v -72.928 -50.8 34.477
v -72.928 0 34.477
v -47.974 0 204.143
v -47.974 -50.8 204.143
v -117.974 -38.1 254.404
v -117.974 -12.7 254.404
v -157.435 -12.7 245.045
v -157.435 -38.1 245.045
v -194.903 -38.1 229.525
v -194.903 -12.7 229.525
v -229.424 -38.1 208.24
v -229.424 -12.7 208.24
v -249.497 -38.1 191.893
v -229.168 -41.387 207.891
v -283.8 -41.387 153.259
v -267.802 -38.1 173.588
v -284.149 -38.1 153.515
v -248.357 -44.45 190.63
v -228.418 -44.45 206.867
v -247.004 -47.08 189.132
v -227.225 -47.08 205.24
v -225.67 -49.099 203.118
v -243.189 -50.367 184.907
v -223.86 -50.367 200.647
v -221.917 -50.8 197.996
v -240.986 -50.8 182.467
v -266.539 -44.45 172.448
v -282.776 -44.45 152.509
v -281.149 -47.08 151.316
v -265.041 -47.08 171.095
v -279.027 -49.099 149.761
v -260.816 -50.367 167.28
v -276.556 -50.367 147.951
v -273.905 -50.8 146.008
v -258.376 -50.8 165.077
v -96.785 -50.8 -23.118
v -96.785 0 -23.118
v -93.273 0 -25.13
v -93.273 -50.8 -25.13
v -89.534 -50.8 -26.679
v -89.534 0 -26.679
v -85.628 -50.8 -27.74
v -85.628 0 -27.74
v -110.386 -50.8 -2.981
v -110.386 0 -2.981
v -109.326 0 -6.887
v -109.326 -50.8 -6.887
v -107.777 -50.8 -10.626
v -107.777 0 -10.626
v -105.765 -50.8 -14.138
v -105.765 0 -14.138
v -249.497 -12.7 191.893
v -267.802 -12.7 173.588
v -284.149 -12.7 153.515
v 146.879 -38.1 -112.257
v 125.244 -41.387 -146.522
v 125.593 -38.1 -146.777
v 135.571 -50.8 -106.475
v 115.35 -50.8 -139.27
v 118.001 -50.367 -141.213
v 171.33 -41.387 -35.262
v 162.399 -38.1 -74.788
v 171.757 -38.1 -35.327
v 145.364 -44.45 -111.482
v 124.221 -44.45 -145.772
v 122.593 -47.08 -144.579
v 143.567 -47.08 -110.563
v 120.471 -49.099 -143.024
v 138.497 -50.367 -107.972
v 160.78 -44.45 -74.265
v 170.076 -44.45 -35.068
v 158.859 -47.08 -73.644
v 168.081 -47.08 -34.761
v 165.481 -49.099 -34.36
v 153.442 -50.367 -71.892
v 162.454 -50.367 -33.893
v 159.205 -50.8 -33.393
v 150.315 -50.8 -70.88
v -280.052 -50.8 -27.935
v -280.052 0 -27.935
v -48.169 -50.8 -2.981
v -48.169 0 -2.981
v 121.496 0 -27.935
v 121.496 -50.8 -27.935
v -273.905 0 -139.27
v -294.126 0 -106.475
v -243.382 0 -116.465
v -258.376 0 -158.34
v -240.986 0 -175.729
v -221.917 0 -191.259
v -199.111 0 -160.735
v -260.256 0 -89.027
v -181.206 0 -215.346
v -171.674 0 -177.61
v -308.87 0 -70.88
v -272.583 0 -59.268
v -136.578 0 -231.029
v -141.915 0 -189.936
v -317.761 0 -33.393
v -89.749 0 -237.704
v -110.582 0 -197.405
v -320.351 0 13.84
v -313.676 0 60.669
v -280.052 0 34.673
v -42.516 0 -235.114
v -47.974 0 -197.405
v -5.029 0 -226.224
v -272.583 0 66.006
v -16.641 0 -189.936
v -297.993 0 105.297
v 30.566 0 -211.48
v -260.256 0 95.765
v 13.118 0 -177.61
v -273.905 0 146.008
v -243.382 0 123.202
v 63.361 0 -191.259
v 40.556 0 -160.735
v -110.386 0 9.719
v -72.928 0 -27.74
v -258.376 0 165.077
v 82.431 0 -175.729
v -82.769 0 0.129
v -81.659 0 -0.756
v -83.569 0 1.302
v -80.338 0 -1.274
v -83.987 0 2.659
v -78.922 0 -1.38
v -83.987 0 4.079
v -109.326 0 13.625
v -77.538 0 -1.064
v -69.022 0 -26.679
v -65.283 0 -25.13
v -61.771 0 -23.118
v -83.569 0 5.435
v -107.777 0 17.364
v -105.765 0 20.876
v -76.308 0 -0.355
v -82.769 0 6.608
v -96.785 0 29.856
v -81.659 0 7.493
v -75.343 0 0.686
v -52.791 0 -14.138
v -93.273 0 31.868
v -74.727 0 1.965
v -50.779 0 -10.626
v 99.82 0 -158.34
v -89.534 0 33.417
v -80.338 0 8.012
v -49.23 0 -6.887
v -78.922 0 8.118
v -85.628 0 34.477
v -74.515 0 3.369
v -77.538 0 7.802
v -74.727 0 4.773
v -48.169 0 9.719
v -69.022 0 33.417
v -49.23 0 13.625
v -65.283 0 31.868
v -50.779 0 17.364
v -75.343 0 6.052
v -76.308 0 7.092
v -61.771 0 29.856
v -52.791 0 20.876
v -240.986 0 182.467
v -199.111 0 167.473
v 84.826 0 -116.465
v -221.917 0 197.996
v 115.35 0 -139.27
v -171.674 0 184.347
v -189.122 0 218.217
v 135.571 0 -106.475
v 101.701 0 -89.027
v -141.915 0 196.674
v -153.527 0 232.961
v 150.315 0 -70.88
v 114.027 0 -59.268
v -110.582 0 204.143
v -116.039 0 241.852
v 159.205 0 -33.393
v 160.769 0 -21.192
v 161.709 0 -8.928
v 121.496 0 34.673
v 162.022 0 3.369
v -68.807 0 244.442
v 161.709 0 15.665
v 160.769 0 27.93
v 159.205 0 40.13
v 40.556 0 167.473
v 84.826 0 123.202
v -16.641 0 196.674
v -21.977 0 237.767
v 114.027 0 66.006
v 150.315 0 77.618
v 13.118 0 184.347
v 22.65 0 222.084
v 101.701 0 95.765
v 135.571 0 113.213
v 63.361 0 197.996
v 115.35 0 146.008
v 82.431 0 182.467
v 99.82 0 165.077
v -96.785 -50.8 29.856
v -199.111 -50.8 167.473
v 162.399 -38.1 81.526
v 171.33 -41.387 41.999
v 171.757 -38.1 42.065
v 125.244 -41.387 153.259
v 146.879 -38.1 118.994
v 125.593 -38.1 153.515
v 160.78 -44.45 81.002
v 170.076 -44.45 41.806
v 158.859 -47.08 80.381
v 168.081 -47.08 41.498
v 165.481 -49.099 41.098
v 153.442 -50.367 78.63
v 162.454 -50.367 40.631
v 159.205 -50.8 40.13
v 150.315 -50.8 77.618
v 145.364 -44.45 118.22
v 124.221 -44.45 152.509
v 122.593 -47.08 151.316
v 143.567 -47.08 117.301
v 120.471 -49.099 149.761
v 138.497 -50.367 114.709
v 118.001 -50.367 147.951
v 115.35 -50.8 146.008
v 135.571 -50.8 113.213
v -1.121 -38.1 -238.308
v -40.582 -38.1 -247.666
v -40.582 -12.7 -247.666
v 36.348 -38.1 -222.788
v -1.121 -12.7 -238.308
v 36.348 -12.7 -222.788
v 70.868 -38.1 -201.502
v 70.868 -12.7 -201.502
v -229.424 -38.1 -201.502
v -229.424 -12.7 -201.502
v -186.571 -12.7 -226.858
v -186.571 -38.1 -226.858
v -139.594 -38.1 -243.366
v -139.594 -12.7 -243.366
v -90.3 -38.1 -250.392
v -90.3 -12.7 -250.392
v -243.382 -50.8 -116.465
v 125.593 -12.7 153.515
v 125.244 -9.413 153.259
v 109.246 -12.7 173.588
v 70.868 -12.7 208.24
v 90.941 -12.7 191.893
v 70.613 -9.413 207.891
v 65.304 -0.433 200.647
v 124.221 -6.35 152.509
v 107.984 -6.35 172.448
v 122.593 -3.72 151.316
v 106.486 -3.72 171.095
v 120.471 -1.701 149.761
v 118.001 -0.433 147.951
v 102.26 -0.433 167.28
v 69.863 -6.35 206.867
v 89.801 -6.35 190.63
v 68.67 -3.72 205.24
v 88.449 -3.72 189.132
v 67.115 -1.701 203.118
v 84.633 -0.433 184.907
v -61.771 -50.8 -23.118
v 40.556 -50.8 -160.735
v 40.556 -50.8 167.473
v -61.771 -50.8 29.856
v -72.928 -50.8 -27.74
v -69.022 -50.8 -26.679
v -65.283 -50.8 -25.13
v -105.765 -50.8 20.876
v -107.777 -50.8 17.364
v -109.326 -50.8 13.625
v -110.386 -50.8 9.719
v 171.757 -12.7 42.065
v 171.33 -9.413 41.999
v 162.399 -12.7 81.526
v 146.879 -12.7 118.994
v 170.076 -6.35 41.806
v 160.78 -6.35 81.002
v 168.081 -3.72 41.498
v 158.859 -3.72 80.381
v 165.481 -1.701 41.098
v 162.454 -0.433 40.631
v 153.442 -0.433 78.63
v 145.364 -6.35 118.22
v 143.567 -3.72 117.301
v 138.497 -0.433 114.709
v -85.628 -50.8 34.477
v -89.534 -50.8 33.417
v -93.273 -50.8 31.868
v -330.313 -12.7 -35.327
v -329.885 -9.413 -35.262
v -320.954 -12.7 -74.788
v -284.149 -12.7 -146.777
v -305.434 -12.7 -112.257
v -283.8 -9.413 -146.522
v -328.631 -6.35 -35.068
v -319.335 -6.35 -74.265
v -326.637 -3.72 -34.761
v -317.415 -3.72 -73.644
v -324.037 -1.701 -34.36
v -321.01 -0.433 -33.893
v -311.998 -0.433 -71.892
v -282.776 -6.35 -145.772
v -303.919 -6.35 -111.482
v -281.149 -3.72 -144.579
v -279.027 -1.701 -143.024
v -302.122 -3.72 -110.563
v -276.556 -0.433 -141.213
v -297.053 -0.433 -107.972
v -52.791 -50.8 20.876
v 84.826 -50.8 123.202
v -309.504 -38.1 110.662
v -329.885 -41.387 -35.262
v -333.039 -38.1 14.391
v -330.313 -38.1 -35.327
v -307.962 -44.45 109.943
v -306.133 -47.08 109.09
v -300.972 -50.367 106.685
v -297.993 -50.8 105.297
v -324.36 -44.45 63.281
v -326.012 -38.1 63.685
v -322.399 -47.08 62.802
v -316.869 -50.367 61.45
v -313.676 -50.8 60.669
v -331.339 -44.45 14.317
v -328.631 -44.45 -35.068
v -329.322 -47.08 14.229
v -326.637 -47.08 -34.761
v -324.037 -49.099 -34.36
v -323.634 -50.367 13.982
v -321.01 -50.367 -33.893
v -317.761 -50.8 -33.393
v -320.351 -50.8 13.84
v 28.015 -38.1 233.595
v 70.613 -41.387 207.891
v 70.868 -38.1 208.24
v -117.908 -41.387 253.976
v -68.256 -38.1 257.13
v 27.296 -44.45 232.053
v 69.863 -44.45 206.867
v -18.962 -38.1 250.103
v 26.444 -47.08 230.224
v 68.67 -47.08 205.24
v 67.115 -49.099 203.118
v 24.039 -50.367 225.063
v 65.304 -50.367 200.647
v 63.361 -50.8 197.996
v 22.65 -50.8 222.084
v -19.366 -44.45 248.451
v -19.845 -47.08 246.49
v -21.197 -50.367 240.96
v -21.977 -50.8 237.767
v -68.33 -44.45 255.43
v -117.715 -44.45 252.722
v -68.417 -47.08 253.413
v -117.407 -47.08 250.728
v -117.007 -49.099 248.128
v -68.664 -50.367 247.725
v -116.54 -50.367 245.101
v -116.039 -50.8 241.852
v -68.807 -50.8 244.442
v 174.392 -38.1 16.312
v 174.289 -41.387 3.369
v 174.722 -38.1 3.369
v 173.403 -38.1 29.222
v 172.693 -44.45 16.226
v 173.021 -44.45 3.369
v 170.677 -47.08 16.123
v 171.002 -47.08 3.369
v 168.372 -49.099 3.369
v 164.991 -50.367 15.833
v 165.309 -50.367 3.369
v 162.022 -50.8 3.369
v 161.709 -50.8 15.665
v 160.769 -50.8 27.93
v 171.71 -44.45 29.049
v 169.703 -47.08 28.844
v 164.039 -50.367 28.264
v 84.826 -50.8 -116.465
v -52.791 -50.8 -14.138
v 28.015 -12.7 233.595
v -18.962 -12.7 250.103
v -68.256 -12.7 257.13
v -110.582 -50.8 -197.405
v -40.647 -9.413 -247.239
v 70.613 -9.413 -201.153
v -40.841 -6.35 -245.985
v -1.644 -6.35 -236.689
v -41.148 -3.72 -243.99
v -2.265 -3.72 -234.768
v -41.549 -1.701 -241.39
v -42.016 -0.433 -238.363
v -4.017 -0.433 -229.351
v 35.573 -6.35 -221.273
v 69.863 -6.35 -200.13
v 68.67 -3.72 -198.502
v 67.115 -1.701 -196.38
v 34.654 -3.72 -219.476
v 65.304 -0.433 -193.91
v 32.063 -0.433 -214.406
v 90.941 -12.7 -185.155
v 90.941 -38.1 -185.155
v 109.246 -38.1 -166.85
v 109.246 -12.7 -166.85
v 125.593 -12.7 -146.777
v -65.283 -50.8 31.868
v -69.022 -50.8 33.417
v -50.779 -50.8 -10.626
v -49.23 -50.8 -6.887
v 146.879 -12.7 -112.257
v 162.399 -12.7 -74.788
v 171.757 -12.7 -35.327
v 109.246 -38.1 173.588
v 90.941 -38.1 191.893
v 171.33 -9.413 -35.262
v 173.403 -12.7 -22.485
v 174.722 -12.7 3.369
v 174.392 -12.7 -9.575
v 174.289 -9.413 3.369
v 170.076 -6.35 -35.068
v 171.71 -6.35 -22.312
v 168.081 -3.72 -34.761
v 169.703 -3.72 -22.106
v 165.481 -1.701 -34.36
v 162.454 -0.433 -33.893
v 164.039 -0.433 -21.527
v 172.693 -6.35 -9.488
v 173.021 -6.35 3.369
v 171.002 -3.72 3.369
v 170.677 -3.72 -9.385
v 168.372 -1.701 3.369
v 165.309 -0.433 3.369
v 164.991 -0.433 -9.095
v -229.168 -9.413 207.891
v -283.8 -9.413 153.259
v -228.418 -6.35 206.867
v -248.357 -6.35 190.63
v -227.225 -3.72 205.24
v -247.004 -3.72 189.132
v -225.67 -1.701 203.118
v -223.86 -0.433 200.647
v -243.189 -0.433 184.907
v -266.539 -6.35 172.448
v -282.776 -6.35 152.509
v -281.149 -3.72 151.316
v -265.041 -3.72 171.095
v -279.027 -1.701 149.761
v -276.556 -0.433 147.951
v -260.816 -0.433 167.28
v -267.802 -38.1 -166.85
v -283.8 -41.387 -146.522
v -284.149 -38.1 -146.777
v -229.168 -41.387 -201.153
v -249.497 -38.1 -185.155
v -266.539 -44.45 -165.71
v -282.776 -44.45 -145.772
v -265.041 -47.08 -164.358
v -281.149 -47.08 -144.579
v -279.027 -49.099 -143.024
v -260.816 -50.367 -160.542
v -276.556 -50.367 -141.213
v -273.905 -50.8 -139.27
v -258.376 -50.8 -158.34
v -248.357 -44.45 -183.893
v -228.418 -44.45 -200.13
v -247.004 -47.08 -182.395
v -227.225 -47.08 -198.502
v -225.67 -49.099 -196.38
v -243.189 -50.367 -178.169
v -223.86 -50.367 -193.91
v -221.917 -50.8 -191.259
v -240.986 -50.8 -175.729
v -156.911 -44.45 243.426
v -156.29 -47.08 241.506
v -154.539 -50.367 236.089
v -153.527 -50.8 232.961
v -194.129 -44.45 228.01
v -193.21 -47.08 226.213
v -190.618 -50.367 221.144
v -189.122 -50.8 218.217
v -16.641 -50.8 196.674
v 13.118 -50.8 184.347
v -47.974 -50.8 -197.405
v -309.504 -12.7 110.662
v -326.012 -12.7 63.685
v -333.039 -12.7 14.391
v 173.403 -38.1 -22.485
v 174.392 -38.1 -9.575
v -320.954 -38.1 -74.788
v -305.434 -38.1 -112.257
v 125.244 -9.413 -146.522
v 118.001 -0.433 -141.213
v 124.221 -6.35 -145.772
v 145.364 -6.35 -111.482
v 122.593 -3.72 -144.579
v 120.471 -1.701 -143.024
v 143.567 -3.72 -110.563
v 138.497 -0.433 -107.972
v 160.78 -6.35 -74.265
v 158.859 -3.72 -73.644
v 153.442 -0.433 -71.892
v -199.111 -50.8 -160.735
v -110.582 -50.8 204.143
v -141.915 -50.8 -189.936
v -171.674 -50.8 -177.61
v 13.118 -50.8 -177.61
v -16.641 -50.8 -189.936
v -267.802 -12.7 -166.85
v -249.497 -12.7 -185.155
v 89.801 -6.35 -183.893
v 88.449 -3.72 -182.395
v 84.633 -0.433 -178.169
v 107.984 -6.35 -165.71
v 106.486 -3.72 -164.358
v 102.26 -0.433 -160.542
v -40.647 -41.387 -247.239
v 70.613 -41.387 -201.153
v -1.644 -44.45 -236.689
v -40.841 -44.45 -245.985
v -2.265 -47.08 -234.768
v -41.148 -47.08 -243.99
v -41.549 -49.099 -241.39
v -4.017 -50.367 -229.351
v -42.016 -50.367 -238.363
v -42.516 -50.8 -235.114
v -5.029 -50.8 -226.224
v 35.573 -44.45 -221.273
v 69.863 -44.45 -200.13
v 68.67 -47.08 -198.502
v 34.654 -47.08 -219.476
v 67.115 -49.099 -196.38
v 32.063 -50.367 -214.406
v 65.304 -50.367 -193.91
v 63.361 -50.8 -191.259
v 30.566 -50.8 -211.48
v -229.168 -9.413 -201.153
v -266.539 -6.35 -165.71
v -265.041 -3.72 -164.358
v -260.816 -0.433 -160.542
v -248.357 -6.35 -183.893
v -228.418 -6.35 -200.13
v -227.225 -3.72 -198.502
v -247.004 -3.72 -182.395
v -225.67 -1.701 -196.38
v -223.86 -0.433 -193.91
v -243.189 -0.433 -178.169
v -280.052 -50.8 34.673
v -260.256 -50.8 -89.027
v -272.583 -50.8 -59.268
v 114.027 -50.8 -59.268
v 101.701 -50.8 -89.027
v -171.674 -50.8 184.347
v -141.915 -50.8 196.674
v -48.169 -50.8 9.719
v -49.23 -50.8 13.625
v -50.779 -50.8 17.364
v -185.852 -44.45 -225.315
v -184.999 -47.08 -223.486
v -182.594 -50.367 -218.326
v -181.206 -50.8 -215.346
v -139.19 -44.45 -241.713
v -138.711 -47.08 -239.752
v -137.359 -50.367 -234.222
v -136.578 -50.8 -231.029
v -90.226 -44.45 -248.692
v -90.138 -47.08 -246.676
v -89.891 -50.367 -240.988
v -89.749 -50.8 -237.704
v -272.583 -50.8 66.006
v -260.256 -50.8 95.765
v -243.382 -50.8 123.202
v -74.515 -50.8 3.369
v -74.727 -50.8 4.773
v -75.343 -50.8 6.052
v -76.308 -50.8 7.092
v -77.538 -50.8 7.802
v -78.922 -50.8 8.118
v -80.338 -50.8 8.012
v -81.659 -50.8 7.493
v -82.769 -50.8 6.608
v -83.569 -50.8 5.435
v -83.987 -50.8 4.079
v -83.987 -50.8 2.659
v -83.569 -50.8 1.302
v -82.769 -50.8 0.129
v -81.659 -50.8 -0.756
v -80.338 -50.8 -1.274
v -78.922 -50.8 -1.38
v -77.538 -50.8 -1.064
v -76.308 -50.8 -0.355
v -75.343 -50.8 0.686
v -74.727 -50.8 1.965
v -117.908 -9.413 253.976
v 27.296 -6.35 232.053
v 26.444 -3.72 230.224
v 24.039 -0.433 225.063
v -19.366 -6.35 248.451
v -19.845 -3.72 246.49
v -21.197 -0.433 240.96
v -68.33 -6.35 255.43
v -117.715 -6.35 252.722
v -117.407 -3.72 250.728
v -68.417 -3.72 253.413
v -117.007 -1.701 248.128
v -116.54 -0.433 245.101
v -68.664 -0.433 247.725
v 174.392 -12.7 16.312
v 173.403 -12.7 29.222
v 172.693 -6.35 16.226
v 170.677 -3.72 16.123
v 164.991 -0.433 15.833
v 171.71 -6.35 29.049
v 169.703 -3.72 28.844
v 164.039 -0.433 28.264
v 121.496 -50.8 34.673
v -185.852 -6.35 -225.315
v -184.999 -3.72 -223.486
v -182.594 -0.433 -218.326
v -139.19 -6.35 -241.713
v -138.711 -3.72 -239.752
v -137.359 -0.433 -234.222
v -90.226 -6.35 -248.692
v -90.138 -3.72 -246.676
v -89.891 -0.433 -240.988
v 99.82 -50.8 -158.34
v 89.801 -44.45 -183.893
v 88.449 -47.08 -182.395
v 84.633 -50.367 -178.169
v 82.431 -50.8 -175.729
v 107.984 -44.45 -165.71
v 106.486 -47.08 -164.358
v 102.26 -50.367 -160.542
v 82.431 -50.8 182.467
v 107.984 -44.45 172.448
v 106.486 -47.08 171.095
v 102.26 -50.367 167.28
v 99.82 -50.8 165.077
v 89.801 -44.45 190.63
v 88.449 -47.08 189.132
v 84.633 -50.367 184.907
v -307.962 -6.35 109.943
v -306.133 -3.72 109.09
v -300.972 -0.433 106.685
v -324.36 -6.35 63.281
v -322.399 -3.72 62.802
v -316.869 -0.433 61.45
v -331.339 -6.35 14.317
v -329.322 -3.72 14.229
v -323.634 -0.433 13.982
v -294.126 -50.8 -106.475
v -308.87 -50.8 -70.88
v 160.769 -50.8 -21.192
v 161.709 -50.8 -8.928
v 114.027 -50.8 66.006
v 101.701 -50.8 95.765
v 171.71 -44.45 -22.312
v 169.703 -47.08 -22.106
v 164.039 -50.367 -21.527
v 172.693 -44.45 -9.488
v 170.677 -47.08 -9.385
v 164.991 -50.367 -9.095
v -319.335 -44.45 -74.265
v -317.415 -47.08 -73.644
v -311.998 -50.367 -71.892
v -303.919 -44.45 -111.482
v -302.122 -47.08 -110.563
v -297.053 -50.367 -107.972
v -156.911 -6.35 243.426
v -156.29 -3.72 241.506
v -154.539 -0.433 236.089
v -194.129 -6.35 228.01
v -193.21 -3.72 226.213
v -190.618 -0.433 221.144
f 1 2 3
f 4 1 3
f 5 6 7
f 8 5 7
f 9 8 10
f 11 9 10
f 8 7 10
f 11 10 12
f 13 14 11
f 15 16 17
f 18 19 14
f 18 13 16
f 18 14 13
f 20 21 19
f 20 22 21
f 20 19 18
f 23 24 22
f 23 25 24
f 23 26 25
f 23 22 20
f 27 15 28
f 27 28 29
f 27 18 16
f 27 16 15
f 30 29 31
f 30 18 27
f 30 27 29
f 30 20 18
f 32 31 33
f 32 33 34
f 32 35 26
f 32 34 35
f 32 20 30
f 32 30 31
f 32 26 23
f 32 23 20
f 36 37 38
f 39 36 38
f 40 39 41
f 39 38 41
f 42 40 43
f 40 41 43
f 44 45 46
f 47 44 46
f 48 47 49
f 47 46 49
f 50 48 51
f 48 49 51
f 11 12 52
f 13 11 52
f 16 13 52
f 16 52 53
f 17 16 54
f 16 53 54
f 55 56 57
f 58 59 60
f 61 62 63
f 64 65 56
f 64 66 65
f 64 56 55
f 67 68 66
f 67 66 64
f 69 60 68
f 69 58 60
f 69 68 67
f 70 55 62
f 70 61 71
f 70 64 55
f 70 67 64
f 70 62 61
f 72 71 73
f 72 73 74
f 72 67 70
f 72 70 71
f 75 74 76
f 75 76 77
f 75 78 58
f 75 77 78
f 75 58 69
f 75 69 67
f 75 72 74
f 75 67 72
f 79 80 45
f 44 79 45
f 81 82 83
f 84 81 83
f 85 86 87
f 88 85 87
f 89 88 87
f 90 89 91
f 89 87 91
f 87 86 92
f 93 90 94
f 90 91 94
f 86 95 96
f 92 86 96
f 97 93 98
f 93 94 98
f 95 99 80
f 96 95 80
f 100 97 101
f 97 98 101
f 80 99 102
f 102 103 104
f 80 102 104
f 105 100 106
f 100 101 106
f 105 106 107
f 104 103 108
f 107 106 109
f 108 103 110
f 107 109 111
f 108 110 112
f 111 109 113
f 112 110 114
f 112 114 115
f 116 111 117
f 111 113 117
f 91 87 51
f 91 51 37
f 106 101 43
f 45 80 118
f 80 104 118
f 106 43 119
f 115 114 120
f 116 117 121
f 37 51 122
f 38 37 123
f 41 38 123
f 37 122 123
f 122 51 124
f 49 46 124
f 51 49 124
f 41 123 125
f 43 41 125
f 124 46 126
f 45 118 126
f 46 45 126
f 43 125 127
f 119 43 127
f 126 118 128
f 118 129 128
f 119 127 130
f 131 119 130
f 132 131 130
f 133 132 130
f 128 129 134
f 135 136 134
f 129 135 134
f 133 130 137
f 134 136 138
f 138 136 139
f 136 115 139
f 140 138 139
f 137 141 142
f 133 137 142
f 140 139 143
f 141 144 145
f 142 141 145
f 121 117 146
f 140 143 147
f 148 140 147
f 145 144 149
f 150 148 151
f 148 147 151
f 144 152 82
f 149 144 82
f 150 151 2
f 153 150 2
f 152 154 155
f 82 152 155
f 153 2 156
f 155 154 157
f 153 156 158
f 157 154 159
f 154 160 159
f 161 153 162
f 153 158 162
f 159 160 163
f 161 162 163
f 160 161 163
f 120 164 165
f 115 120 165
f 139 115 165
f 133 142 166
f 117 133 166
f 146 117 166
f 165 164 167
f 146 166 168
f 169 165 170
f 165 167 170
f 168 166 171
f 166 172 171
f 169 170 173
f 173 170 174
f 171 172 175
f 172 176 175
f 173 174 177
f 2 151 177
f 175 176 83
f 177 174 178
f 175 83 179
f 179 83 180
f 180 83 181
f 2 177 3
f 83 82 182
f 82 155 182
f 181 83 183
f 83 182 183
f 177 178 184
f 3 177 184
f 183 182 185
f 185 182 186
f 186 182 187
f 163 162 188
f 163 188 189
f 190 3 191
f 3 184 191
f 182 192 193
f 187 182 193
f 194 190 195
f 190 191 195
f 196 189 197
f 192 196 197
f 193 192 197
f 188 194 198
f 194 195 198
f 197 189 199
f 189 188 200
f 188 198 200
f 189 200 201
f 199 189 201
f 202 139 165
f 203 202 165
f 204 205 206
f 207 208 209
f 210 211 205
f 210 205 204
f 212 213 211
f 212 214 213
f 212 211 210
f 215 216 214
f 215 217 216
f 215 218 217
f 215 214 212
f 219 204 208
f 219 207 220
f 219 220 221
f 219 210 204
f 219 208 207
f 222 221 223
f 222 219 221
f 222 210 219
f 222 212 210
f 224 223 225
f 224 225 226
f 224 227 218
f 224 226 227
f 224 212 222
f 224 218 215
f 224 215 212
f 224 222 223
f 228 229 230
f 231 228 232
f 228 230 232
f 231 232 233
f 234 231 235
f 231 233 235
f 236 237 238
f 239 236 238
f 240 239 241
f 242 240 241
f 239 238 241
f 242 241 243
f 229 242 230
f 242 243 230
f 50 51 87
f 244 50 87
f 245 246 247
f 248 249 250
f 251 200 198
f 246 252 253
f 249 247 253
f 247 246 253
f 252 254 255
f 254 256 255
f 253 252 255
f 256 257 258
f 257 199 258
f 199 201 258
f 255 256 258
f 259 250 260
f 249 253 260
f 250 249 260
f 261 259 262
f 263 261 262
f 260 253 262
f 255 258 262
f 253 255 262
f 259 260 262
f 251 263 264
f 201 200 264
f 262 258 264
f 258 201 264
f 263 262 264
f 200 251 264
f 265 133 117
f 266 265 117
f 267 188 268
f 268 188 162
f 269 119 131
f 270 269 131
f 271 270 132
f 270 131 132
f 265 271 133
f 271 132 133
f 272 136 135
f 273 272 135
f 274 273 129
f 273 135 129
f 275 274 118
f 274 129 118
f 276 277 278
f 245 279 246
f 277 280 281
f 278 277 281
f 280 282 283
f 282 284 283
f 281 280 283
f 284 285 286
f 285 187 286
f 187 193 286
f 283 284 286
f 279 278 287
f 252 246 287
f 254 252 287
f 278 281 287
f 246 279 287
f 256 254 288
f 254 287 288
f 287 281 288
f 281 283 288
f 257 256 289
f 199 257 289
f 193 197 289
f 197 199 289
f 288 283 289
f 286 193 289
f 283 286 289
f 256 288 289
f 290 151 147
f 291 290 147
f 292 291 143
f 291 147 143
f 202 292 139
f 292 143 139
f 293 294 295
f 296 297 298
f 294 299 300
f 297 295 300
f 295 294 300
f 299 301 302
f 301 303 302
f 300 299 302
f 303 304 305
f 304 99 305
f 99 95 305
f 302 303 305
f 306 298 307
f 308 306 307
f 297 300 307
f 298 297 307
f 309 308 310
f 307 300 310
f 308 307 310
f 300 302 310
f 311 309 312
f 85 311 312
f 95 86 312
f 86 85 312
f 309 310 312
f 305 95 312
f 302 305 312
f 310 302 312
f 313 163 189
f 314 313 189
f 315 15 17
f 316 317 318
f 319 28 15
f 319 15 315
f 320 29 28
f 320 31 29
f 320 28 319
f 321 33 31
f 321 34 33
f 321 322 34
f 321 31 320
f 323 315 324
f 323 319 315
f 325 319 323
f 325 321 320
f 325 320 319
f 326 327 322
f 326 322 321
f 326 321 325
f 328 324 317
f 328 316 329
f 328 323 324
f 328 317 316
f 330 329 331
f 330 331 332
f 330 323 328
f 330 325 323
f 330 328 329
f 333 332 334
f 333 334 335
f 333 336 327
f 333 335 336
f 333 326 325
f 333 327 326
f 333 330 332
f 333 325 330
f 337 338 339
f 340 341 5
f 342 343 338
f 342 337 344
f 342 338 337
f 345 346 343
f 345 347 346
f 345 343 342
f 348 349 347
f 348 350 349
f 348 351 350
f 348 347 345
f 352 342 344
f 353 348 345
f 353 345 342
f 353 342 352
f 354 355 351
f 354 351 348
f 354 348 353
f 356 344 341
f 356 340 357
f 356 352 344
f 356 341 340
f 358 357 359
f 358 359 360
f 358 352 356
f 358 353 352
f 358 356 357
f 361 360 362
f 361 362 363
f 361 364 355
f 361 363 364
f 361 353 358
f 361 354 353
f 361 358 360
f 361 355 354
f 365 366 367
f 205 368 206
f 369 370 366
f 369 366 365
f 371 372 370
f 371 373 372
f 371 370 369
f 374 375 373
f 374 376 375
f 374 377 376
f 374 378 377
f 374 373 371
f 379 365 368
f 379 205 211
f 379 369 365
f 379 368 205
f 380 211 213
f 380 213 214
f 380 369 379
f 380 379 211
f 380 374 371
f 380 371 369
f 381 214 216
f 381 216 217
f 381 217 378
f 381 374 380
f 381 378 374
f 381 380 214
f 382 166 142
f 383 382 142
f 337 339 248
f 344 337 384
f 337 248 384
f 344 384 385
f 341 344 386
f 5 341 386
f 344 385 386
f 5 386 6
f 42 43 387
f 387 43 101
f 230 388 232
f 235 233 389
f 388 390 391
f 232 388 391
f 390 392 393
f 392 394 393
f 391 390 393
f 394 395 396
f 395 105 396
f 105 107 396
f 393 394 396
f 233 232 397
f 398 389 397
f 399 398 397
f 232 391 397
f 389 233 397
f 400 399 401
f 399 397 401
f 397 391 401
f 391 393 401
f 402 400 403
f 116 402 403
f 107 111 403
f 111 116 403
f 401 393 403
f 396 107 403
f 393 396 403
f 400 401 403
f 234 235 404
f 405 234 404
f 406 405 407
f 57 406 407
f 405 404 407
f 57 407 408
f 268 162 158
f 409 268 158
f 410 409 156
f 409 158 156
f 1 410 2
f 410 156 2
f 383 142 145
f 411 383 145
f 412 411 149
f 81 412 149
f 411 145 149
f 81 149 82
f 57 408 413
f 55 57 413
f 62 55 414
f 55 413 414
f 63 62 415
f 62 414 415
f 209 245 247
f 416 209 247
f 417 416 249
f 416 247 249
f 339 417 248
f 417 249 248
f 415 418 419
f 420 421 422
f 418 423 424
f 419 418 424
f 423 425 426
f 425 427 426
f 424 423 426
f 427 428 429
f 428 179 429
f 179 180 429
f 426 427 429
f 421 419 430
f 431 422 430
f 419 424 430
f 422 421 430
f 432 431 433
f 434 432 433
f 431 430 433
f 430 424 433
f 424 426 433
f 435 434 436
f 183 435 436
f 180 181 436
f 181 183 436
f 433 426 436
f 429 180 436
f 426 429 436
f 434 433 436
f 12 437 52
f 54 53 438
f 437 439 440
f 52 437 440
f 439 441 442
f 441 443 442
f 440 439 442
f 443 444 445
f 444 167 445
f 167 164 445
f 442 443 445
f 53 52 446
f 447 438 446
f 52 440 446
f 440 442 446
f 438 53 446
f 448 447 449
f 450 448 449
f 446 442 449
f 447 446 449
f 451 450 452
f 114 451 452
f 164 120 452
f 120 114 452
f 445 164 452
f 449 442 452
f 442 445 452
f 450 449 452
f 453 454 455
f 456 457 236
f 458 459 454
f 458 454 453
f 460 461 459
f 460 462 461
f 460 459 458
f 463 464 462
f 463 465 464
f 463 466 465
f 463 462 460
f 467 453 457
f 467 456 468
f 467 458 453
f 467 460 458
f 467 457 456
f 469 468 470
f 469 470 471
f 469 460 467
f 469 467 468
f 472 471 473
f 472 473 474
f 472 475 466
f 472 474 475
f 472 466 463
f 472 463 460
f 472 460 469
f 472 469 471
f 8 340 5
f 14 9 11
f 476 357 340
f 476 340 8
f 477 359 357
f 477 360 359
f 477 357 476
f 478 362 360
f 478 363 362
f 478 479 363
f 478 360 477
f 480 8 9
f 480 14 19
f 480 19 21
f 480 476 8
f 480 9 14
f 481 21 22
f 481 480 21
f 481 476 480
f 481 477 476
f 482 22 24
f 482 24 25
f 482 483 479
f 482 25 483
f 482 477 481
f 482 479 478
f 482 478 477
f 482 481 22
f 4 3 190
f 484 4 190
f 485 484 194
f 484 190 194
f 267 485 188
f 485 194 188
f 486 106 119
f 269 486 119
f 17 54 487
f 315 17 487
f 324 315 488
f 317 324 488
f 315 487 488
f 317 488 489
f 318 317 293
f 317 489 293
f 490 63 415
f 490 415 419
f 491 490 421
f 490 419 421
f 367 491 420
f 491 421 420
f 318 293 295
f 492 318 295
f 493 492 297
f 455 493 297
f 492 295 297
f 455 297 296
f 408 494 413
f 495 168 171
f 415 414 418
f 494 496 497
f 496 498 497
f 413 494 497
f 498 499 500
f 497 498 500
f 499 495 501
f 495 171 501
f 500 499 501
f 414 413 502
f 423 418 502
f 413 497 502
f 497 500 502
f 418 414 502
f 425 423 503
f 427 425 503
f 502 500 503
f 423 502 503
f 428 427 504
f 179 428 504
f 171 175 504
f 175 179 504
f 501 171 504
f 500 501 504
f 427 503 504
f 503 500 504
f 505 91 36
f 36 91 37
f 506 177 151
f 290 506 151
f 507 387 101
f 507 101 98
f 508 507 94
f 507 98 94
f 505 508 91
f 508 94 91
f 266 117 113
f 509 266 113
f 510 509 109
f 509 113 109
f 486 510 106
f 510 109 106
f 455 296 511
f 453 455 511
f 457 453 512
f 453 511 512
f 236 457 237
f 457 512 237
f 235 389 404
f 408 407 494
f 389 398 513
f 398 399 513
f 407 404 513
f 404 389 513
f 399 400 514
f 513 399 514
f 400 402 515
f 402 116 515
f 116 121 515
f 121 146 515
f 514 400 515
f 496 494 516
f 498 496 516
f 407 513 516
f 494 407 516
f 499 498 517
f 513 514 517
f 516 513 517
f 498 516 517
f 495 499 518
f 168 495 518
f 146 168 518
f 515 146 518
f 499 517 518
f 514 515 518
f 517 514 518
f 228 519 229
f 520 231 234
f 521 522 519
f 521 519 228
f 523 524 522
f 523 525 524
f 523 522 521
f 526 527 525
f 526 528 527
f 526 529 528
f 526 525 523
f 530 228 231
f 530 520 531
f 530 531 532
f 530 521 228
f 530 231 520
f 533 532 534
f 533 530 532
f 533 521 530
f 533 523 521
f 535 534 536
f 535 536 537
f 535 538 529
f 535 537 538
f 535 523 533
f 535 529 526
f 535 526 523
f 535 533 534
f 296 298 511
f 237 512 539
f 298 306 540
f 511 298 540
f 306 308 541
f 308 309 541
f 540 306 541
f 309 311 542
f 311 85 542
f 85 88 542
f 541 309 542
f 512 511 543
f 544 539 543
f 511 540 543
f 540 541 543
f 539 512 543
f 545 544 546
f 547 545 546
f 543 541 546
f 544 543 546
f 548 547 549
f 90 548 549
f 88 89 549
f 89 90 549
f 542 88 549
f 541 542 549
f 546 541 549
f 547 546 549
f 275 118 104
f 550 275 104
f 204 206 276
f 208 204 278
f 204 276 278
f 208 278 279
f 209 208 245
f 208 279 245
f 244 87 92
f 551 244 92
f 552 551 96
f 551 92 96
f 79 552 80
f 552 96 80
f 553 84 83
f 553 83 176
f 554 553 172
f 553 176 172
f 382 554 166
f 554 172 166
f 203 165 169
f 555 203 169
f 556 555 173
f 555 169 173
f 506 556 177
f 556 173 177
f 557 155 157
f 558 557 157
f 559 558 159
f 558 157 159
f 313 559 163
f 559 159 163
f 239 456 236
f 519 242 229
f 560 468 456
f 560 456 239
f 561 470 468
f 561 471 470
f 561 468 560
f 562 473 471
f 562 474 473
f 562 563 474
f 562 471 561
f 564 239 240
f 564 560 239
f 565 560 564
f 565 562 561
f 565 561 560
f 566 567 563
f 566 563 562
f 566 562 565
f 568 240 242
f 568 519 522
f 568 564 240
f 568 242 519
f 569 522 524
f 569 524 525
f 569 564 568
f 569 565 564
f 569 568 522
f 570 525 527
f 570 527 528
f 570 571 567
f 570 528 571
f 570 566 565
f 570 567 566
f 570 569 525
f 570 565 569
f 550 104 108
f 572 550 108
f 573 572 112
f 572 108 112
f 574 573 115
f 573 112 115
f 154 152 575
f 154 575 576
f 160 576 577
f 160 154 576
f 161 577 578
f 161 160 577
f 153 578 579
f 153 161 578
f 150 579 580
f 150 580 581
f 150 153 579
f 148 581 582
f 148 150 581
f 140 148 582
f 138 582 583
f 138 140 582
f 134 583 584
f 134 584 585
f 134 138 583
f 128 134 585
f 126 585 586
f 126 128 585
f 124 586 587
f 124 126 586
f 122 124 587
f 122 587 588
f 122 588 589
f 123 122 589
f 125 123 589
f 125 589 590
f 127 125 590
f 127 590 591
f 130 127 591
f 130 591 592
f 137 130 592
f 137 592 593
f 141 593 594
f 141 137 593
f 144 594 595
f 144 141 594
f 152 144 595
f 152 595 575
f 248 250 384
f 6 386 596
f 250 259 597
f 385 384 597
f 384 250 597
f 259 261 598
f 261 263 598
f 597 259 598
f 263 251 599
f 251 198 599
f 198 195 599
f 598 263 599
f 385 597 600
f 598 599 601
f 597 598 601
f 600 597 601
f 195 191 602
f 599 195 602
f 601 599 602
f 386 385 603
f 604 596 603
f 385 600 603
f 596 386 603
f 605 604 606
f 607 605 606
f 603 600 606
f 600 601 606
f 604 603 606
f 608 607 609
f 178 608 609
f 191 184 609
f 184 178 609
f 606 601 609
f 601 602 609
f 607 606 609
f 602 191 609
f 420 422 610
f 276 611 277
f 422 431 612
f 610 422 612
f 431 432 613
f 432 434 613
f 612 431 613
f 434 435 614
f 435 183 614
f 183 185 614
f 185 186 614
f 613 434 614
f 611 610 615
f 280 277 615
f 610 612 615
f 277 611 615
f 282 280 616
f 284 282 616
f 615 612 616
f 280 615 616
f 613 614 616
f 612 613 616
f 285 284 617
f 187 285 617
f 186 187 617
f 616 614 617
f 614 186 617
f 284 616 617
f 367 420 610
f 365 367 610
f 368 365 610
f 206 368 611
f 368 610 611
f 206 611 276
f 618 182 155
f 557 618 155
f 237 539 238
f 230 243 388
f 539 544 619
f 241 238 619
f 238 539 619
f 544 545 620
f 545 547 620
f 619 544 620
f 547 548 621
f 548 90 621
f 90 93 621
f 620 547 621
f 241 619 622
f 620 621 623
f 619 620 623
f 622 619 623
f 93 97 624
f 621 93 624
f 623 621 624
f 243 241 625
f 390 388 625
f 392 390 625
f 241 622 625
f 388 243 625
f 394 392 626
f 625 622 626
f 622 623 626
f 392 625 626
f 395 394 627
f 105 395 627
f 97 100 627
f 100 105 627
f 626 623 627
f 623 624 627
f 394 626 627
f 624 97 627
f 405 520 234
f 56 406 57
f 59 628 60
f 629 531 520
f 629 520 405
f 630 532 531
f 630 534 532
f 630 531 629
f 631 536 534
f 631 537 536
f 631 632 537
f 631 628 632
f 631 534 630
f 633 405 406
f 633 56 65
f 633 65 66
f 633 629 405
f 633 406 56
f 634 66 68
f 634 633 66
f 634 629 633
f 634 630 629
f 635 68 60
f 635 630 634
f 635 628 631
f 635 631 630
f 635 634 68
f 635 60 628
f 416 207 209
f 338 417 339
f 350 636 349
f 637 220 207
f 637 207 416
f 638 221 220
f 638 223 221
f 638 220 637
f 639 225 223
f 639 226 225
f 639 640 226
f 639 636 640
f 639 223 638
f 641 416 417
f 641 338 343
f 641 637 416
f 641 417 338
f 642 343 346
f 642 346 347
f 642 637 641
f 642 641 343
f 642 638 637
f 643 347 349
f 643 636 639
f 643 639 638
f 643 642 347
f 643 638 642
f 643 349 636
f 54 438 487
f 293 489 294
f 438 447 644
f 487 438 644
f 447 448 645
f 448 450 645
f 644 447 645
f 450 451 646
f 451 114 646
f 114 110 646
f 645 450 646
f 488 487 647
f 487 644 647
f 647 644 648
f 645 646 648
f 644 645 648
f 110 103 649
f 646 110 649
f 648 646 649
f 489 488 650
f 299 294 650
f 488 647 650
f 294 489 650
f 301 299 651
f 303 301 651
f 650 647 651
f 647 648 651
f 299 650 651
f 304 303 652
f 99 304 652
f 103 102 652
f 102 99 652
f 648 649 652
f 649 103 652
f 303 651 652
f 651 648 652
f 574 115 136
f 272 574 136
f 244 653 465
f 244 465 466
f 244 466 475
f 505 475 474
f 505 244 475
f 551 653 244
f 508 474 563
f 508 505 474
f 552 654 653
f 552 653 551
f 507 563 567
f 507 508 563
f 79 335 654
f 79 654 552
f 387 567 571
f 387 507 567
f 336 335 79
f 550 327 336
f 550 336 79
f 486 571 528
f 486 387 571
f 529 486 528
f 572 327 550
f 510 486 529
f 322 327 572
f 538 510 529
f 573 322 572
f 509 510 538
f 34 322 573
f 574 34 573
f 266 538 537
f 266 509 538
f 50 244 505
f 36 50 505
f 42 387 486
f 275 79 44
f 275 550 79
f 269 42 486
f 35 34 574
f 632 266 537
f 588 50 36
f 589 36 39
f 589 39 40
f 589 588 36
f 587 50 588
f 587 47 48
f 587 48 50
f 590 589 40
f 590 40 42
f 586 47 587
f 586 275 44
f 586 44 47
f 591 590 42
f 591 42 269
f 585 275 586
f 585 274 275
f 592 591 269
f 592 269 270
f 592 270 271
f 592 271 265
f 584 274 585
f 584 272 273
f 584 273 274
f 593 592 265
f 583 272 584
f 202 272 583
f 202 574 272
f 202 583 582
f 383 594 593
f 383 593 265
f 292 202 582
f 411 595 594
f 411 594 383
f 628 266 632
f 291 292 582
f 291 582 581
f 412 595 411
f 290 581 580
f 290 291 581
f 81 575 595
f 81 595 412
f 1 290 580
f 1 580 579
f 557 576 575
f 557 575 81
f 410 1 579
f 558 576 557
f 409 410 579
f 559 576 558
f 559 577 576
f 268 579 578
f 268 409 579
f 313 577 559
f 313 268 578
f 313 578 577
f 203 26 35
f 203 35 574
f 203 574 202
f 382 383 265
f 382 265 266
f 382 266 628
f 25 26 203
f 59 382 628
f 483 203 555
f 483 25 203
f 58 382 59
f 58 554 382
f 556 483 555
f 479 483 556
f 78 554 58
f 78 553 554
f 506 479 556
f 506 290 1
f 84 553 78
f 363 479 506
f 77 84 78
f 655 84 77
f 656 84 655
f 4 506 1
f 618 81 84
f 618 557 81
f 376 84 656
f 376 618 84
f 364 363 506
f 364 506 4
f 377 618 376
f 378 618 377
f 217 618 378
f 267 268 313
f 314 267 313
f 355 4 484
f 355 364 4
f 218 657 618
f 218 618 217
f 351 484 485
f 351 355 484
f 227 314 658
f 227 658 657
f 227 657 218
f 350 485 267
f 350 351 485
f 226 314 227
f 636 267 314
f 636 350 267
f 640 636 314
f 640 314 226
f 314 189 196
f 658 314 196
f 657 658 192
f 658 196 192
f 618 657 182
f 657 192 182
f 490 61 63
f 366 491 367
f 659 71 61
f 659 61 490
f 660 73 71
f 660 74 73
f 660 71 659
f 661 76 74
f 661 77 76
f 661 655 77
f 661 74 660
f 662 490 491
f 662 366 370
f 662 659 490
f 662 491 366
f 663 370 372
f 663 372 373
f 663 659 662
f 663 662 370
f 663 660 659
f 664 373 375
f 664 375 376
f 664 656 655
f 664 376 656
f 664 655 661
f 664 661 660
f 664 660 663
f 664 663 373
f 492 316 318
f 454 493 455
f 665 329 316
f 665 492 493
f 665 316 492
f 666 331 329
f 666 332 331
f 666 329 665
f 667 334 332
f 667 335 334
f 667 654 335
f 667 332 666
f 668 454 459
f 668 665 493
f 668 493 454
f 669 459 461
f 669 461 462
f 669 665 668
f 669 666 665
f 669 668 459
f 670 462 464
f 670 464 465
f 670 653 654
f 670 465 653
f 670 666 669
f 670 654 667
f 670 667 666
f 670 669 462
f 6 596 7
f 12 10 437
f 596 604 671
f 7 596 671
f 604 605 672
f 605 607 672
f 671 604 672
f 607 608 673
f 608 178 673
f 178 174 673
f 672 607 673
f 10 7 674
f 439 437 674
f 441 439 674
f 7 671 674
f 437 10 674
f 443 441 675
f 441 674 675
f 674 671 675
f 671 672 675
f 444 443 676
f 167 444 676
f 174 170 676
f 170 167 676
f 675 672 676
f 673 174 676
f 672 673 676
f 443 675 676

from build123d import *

# Parameters (mm, degrees)
F0_R     = 4.7625
F1_DEPTH = 50.8
F2_R     = 12.7


with BuildPart() as f1:
    # F0 (on Front) → F1 (new body)
    with BuildSketch(Plane.XZ):
        with BuildLine():
            ThreePointArc((171.7572451724, -35.3274357641), (173.9798664945, -16.0360244509), (174.7221865654, 3.3688088879))
            ThreePointArc((174.7221865654, 3.3688088879), (173.9798657597, 22.7736518176), (171.7572422416, 42.0650725533))
            ThreePointArc((171.7572422416, 42.0650725533), (155.3875841422, 100.5704095954), (125.5931558219, 153.5150241446))
            ThreePointArc((125.5931558219, 153.5150241446), (100.3273021851, 182.9739381109), (70.8683863051, 208.2397895165))
            ThreePointArc((70.8683863051, 208.2397895165), (17.9237694993, 238.0342138268), (-40.5815687826, 254.4038674949))
            ThreePointArc((-40.5815687826, 254.4038674949), (-79.2778230536, 257.3688088879), (-117.9740771, 254.4038645641))
            ThreePointArc((-117.9740771, 254.4038645641), (-176.4794141421, 238.0342064647), (-229.4240286913, 208.2397781444))
            ThreePointArc((-229.4240286913, 208.2397781444), (-258.8829426576, 182.9739245076), (-284.1487940632, 153.5150086276))
            ThreePointArc((-284.1487940632, 153.5150086276), (-313.9432183735, 100.5703918218), (-330.3128720416, 42.0650535399))
            ThreePointArc((-330.3128720416, 42.0650535399), (-333.2778134346, 3.3687992689), (-330.3128691108, -35.3274547775))
            ThreePointArc((-330.3128691108, -35.3274547775), (-313.9432110114, -93.8327918196), (-284.1487826911, -146.7774063688))
            ThreePointArc((-284.1487826911, -146.7774063688), (-258.8829290543, -176.2363203351), (-229.4240131743, -201.5021717407))
            ThreePointArc((-229.4240131743, -201.5021717407), (-176.4793963685, -231.296596051), (-117.9740580866, -247.6662497191))
            ThreePointArc((-117.9740580866, -247.6662497191), (-79.2778038156, -250.6311911121), (-40.5815497692, -247.6662467883))
            ThreePointArc((-40.5815497692, -247.6662467883), (17.9237872729, -231.2965886889), (70.8684018221, -201.5021603686))
            ThreePointArc((70.8684018221, -201.5021603686), (100.3273157884, -176.2363067318), (125.593167194, -146.7773908518))
            ThreePointArc((125.593167194, -146.7773908518), (155.3875915043, -93.832774046), (171.7572451724, -35.3274357641))
        make_face()
        with BuildLine():
            Line((-199.111355404, -160.7353111672), (-96.7847279201, -23.11836622))
            ThreePointArc((-96.7847279201, -23.11836622), (-91.4280109116, -25.9643668909), (-85.6278134346, -27.7397108454))
            Line((-85.6278134346, -27.7397108454), (-110.5818240092, -197.4054397645))
            ThreePointArc((-110.5818240092, -197.4054397645), (-157.0390796928, -184.3635151001), (-199.111355404, -160.7353111672))
        make_face(mode=Mode.SUBTRACT)
        with BuildLine():
            ThreePointArc((-243.3819243, -116.4647456663), (-267.0101314592, -74.3924717671), (-280.0520596864, -27.9352170836))
            Line((-280.0520596864, -27.9352170836), (-110.3863325182, -2.981194295))
            ThreePointArc((-110.3863325182, -2.981194295), (-108.6109879703, -8.7813915903), (-105.7649867513, -14.1381083077))
            Line((-105.7649867513, -14.1381083077), (-243.3819243, -116.4647456663))
        make_face(mode=Mode.SUBTRACT)
        with BuildLine():
            Line((-47.9737874631, -197.4054373639), (-72.9278102517, -27.7397101957))
            ThreePointArc((-72.9278102517, -27.7397101957), (-67.1276129564, -25.9643656478), (-61.770896239, -23.1183644288))
            Line((-61.770896239, -23.1183644288), (40.5557411196, -160.7353019775))
            ThreePointArc((40.5557411196, -160.7353019775), (-1.5165327796, -184.3635091367), (-47.9737874631, -197.4054373639))
        make_face(mode=Mode.SUBTRACT)
        with BuildLine():
            Line((84.8263066205, -116.4647330815), (-52.7906383267, -14.1381055976))
            ThreePointArc((-52.7906383267, -14.1381055976), (-49.9446376558, -8.7813885891), (-48.1692937013, -2.9811911121))
            Line((-48.1692937013, -2.9811911121), (121.4964352178, -27.9352016867))
            ThreePointArc((121.4964352178, -27.9352016867), (108.4545105534, -74.3924573703), (84.8263066205, -116.4647330815))
        make_face(mode=Mode.SUBTRACT)
        with BuildLine():
            Line((-243.3819334897, 123.2023508573), (-105.7649885425, 20.8757233734))
            ThreePointArc((-105.7649885425, 20.8757233734), (-108.6109892134, 15.5190063649), (-110.3863331679, 9.7188088879))
            Line((-110.3863331679, 9.7188088879), (-280.052062087, 34.6728194624))
            ThreePointArc((-280.052062087, 34.6728194624), (-267.0101374226, 81.1300751461), (-243.3819334897, 123.2023508573))
        make_face(mode=Mode.SUBTRACT)
        with BuildLine():
            Line((-110.5818394061, 204.1430551397), (-85.6278166175, 34.4773279715))
            ThreePointArc((-85.6278166175, 34.4773279715), (-91.4280139128, 32.7019834236), (-96.7847306302, 29.8559822046))
            Line((-96.7847306302, 29.8559822046), (-199.1113679888, 167.4729197533))
            ThreePointArc((-199.1113679888, 167.4729197533), (-157.0390940896, 191.1011269125), (-110.5818394061, 204.1430551397))
        make_face(mode=Mode.SUBTRACT)
        with Locations((-79.2778134346, 3.3688088879)):
            Circle(F0_R, mode=Mode.SUBTRACT)
        with BuildLine():
            Line((121.4964328172, 34.6728348594), (-48.169294351, 9.7188120708))
            ThreePointArc((-48.169294351, 9.7188120708), (-49.9446388989, 15.5190093661), (-52.7906401179, 20.8757260835))
            Line((-52.7906401179, 20.8757260835), (84.8262974308, 123.2023634421))
            ThreePointArc((84.8262974308, 123.2023634421), (108.45450459, 81.1300895429), (121.4964328172, 34.6728348594))
        make_face(mode=Mode.SUBTRACT)
        with BuildLine():
            ThreePointArc((-61.7708989491, 29.8559839958), (-67.1276159576, 32.7019846667), (-72.9278134346, 34.4773286212))
            Line((-72.9278134346, 34.4773286212), (-47.9738028601, 204.1430575403))
            ThreePointArc((-47.9738028601, 204.1430575403), (-1.5165471764, 191.1011328759), (40.5557285348, 167.472928943))
            Line((40.5557285348, 167.472928943), (-61.7708989491, 29.8559839958))
        make_face(mode=Mode.SUBTRACT)
    extrude(amount=F1_DEPTH)

    # F2
    f2_edges = [f1.edges().sort_by_distance(p)[0] for p in [
        (-229.424029, -50.8, 208.239778),
        (-229.424029, 0, 208.239778),
    ]]
    fillet(f2_edges, radius=F2_R)


solid = f1.part
